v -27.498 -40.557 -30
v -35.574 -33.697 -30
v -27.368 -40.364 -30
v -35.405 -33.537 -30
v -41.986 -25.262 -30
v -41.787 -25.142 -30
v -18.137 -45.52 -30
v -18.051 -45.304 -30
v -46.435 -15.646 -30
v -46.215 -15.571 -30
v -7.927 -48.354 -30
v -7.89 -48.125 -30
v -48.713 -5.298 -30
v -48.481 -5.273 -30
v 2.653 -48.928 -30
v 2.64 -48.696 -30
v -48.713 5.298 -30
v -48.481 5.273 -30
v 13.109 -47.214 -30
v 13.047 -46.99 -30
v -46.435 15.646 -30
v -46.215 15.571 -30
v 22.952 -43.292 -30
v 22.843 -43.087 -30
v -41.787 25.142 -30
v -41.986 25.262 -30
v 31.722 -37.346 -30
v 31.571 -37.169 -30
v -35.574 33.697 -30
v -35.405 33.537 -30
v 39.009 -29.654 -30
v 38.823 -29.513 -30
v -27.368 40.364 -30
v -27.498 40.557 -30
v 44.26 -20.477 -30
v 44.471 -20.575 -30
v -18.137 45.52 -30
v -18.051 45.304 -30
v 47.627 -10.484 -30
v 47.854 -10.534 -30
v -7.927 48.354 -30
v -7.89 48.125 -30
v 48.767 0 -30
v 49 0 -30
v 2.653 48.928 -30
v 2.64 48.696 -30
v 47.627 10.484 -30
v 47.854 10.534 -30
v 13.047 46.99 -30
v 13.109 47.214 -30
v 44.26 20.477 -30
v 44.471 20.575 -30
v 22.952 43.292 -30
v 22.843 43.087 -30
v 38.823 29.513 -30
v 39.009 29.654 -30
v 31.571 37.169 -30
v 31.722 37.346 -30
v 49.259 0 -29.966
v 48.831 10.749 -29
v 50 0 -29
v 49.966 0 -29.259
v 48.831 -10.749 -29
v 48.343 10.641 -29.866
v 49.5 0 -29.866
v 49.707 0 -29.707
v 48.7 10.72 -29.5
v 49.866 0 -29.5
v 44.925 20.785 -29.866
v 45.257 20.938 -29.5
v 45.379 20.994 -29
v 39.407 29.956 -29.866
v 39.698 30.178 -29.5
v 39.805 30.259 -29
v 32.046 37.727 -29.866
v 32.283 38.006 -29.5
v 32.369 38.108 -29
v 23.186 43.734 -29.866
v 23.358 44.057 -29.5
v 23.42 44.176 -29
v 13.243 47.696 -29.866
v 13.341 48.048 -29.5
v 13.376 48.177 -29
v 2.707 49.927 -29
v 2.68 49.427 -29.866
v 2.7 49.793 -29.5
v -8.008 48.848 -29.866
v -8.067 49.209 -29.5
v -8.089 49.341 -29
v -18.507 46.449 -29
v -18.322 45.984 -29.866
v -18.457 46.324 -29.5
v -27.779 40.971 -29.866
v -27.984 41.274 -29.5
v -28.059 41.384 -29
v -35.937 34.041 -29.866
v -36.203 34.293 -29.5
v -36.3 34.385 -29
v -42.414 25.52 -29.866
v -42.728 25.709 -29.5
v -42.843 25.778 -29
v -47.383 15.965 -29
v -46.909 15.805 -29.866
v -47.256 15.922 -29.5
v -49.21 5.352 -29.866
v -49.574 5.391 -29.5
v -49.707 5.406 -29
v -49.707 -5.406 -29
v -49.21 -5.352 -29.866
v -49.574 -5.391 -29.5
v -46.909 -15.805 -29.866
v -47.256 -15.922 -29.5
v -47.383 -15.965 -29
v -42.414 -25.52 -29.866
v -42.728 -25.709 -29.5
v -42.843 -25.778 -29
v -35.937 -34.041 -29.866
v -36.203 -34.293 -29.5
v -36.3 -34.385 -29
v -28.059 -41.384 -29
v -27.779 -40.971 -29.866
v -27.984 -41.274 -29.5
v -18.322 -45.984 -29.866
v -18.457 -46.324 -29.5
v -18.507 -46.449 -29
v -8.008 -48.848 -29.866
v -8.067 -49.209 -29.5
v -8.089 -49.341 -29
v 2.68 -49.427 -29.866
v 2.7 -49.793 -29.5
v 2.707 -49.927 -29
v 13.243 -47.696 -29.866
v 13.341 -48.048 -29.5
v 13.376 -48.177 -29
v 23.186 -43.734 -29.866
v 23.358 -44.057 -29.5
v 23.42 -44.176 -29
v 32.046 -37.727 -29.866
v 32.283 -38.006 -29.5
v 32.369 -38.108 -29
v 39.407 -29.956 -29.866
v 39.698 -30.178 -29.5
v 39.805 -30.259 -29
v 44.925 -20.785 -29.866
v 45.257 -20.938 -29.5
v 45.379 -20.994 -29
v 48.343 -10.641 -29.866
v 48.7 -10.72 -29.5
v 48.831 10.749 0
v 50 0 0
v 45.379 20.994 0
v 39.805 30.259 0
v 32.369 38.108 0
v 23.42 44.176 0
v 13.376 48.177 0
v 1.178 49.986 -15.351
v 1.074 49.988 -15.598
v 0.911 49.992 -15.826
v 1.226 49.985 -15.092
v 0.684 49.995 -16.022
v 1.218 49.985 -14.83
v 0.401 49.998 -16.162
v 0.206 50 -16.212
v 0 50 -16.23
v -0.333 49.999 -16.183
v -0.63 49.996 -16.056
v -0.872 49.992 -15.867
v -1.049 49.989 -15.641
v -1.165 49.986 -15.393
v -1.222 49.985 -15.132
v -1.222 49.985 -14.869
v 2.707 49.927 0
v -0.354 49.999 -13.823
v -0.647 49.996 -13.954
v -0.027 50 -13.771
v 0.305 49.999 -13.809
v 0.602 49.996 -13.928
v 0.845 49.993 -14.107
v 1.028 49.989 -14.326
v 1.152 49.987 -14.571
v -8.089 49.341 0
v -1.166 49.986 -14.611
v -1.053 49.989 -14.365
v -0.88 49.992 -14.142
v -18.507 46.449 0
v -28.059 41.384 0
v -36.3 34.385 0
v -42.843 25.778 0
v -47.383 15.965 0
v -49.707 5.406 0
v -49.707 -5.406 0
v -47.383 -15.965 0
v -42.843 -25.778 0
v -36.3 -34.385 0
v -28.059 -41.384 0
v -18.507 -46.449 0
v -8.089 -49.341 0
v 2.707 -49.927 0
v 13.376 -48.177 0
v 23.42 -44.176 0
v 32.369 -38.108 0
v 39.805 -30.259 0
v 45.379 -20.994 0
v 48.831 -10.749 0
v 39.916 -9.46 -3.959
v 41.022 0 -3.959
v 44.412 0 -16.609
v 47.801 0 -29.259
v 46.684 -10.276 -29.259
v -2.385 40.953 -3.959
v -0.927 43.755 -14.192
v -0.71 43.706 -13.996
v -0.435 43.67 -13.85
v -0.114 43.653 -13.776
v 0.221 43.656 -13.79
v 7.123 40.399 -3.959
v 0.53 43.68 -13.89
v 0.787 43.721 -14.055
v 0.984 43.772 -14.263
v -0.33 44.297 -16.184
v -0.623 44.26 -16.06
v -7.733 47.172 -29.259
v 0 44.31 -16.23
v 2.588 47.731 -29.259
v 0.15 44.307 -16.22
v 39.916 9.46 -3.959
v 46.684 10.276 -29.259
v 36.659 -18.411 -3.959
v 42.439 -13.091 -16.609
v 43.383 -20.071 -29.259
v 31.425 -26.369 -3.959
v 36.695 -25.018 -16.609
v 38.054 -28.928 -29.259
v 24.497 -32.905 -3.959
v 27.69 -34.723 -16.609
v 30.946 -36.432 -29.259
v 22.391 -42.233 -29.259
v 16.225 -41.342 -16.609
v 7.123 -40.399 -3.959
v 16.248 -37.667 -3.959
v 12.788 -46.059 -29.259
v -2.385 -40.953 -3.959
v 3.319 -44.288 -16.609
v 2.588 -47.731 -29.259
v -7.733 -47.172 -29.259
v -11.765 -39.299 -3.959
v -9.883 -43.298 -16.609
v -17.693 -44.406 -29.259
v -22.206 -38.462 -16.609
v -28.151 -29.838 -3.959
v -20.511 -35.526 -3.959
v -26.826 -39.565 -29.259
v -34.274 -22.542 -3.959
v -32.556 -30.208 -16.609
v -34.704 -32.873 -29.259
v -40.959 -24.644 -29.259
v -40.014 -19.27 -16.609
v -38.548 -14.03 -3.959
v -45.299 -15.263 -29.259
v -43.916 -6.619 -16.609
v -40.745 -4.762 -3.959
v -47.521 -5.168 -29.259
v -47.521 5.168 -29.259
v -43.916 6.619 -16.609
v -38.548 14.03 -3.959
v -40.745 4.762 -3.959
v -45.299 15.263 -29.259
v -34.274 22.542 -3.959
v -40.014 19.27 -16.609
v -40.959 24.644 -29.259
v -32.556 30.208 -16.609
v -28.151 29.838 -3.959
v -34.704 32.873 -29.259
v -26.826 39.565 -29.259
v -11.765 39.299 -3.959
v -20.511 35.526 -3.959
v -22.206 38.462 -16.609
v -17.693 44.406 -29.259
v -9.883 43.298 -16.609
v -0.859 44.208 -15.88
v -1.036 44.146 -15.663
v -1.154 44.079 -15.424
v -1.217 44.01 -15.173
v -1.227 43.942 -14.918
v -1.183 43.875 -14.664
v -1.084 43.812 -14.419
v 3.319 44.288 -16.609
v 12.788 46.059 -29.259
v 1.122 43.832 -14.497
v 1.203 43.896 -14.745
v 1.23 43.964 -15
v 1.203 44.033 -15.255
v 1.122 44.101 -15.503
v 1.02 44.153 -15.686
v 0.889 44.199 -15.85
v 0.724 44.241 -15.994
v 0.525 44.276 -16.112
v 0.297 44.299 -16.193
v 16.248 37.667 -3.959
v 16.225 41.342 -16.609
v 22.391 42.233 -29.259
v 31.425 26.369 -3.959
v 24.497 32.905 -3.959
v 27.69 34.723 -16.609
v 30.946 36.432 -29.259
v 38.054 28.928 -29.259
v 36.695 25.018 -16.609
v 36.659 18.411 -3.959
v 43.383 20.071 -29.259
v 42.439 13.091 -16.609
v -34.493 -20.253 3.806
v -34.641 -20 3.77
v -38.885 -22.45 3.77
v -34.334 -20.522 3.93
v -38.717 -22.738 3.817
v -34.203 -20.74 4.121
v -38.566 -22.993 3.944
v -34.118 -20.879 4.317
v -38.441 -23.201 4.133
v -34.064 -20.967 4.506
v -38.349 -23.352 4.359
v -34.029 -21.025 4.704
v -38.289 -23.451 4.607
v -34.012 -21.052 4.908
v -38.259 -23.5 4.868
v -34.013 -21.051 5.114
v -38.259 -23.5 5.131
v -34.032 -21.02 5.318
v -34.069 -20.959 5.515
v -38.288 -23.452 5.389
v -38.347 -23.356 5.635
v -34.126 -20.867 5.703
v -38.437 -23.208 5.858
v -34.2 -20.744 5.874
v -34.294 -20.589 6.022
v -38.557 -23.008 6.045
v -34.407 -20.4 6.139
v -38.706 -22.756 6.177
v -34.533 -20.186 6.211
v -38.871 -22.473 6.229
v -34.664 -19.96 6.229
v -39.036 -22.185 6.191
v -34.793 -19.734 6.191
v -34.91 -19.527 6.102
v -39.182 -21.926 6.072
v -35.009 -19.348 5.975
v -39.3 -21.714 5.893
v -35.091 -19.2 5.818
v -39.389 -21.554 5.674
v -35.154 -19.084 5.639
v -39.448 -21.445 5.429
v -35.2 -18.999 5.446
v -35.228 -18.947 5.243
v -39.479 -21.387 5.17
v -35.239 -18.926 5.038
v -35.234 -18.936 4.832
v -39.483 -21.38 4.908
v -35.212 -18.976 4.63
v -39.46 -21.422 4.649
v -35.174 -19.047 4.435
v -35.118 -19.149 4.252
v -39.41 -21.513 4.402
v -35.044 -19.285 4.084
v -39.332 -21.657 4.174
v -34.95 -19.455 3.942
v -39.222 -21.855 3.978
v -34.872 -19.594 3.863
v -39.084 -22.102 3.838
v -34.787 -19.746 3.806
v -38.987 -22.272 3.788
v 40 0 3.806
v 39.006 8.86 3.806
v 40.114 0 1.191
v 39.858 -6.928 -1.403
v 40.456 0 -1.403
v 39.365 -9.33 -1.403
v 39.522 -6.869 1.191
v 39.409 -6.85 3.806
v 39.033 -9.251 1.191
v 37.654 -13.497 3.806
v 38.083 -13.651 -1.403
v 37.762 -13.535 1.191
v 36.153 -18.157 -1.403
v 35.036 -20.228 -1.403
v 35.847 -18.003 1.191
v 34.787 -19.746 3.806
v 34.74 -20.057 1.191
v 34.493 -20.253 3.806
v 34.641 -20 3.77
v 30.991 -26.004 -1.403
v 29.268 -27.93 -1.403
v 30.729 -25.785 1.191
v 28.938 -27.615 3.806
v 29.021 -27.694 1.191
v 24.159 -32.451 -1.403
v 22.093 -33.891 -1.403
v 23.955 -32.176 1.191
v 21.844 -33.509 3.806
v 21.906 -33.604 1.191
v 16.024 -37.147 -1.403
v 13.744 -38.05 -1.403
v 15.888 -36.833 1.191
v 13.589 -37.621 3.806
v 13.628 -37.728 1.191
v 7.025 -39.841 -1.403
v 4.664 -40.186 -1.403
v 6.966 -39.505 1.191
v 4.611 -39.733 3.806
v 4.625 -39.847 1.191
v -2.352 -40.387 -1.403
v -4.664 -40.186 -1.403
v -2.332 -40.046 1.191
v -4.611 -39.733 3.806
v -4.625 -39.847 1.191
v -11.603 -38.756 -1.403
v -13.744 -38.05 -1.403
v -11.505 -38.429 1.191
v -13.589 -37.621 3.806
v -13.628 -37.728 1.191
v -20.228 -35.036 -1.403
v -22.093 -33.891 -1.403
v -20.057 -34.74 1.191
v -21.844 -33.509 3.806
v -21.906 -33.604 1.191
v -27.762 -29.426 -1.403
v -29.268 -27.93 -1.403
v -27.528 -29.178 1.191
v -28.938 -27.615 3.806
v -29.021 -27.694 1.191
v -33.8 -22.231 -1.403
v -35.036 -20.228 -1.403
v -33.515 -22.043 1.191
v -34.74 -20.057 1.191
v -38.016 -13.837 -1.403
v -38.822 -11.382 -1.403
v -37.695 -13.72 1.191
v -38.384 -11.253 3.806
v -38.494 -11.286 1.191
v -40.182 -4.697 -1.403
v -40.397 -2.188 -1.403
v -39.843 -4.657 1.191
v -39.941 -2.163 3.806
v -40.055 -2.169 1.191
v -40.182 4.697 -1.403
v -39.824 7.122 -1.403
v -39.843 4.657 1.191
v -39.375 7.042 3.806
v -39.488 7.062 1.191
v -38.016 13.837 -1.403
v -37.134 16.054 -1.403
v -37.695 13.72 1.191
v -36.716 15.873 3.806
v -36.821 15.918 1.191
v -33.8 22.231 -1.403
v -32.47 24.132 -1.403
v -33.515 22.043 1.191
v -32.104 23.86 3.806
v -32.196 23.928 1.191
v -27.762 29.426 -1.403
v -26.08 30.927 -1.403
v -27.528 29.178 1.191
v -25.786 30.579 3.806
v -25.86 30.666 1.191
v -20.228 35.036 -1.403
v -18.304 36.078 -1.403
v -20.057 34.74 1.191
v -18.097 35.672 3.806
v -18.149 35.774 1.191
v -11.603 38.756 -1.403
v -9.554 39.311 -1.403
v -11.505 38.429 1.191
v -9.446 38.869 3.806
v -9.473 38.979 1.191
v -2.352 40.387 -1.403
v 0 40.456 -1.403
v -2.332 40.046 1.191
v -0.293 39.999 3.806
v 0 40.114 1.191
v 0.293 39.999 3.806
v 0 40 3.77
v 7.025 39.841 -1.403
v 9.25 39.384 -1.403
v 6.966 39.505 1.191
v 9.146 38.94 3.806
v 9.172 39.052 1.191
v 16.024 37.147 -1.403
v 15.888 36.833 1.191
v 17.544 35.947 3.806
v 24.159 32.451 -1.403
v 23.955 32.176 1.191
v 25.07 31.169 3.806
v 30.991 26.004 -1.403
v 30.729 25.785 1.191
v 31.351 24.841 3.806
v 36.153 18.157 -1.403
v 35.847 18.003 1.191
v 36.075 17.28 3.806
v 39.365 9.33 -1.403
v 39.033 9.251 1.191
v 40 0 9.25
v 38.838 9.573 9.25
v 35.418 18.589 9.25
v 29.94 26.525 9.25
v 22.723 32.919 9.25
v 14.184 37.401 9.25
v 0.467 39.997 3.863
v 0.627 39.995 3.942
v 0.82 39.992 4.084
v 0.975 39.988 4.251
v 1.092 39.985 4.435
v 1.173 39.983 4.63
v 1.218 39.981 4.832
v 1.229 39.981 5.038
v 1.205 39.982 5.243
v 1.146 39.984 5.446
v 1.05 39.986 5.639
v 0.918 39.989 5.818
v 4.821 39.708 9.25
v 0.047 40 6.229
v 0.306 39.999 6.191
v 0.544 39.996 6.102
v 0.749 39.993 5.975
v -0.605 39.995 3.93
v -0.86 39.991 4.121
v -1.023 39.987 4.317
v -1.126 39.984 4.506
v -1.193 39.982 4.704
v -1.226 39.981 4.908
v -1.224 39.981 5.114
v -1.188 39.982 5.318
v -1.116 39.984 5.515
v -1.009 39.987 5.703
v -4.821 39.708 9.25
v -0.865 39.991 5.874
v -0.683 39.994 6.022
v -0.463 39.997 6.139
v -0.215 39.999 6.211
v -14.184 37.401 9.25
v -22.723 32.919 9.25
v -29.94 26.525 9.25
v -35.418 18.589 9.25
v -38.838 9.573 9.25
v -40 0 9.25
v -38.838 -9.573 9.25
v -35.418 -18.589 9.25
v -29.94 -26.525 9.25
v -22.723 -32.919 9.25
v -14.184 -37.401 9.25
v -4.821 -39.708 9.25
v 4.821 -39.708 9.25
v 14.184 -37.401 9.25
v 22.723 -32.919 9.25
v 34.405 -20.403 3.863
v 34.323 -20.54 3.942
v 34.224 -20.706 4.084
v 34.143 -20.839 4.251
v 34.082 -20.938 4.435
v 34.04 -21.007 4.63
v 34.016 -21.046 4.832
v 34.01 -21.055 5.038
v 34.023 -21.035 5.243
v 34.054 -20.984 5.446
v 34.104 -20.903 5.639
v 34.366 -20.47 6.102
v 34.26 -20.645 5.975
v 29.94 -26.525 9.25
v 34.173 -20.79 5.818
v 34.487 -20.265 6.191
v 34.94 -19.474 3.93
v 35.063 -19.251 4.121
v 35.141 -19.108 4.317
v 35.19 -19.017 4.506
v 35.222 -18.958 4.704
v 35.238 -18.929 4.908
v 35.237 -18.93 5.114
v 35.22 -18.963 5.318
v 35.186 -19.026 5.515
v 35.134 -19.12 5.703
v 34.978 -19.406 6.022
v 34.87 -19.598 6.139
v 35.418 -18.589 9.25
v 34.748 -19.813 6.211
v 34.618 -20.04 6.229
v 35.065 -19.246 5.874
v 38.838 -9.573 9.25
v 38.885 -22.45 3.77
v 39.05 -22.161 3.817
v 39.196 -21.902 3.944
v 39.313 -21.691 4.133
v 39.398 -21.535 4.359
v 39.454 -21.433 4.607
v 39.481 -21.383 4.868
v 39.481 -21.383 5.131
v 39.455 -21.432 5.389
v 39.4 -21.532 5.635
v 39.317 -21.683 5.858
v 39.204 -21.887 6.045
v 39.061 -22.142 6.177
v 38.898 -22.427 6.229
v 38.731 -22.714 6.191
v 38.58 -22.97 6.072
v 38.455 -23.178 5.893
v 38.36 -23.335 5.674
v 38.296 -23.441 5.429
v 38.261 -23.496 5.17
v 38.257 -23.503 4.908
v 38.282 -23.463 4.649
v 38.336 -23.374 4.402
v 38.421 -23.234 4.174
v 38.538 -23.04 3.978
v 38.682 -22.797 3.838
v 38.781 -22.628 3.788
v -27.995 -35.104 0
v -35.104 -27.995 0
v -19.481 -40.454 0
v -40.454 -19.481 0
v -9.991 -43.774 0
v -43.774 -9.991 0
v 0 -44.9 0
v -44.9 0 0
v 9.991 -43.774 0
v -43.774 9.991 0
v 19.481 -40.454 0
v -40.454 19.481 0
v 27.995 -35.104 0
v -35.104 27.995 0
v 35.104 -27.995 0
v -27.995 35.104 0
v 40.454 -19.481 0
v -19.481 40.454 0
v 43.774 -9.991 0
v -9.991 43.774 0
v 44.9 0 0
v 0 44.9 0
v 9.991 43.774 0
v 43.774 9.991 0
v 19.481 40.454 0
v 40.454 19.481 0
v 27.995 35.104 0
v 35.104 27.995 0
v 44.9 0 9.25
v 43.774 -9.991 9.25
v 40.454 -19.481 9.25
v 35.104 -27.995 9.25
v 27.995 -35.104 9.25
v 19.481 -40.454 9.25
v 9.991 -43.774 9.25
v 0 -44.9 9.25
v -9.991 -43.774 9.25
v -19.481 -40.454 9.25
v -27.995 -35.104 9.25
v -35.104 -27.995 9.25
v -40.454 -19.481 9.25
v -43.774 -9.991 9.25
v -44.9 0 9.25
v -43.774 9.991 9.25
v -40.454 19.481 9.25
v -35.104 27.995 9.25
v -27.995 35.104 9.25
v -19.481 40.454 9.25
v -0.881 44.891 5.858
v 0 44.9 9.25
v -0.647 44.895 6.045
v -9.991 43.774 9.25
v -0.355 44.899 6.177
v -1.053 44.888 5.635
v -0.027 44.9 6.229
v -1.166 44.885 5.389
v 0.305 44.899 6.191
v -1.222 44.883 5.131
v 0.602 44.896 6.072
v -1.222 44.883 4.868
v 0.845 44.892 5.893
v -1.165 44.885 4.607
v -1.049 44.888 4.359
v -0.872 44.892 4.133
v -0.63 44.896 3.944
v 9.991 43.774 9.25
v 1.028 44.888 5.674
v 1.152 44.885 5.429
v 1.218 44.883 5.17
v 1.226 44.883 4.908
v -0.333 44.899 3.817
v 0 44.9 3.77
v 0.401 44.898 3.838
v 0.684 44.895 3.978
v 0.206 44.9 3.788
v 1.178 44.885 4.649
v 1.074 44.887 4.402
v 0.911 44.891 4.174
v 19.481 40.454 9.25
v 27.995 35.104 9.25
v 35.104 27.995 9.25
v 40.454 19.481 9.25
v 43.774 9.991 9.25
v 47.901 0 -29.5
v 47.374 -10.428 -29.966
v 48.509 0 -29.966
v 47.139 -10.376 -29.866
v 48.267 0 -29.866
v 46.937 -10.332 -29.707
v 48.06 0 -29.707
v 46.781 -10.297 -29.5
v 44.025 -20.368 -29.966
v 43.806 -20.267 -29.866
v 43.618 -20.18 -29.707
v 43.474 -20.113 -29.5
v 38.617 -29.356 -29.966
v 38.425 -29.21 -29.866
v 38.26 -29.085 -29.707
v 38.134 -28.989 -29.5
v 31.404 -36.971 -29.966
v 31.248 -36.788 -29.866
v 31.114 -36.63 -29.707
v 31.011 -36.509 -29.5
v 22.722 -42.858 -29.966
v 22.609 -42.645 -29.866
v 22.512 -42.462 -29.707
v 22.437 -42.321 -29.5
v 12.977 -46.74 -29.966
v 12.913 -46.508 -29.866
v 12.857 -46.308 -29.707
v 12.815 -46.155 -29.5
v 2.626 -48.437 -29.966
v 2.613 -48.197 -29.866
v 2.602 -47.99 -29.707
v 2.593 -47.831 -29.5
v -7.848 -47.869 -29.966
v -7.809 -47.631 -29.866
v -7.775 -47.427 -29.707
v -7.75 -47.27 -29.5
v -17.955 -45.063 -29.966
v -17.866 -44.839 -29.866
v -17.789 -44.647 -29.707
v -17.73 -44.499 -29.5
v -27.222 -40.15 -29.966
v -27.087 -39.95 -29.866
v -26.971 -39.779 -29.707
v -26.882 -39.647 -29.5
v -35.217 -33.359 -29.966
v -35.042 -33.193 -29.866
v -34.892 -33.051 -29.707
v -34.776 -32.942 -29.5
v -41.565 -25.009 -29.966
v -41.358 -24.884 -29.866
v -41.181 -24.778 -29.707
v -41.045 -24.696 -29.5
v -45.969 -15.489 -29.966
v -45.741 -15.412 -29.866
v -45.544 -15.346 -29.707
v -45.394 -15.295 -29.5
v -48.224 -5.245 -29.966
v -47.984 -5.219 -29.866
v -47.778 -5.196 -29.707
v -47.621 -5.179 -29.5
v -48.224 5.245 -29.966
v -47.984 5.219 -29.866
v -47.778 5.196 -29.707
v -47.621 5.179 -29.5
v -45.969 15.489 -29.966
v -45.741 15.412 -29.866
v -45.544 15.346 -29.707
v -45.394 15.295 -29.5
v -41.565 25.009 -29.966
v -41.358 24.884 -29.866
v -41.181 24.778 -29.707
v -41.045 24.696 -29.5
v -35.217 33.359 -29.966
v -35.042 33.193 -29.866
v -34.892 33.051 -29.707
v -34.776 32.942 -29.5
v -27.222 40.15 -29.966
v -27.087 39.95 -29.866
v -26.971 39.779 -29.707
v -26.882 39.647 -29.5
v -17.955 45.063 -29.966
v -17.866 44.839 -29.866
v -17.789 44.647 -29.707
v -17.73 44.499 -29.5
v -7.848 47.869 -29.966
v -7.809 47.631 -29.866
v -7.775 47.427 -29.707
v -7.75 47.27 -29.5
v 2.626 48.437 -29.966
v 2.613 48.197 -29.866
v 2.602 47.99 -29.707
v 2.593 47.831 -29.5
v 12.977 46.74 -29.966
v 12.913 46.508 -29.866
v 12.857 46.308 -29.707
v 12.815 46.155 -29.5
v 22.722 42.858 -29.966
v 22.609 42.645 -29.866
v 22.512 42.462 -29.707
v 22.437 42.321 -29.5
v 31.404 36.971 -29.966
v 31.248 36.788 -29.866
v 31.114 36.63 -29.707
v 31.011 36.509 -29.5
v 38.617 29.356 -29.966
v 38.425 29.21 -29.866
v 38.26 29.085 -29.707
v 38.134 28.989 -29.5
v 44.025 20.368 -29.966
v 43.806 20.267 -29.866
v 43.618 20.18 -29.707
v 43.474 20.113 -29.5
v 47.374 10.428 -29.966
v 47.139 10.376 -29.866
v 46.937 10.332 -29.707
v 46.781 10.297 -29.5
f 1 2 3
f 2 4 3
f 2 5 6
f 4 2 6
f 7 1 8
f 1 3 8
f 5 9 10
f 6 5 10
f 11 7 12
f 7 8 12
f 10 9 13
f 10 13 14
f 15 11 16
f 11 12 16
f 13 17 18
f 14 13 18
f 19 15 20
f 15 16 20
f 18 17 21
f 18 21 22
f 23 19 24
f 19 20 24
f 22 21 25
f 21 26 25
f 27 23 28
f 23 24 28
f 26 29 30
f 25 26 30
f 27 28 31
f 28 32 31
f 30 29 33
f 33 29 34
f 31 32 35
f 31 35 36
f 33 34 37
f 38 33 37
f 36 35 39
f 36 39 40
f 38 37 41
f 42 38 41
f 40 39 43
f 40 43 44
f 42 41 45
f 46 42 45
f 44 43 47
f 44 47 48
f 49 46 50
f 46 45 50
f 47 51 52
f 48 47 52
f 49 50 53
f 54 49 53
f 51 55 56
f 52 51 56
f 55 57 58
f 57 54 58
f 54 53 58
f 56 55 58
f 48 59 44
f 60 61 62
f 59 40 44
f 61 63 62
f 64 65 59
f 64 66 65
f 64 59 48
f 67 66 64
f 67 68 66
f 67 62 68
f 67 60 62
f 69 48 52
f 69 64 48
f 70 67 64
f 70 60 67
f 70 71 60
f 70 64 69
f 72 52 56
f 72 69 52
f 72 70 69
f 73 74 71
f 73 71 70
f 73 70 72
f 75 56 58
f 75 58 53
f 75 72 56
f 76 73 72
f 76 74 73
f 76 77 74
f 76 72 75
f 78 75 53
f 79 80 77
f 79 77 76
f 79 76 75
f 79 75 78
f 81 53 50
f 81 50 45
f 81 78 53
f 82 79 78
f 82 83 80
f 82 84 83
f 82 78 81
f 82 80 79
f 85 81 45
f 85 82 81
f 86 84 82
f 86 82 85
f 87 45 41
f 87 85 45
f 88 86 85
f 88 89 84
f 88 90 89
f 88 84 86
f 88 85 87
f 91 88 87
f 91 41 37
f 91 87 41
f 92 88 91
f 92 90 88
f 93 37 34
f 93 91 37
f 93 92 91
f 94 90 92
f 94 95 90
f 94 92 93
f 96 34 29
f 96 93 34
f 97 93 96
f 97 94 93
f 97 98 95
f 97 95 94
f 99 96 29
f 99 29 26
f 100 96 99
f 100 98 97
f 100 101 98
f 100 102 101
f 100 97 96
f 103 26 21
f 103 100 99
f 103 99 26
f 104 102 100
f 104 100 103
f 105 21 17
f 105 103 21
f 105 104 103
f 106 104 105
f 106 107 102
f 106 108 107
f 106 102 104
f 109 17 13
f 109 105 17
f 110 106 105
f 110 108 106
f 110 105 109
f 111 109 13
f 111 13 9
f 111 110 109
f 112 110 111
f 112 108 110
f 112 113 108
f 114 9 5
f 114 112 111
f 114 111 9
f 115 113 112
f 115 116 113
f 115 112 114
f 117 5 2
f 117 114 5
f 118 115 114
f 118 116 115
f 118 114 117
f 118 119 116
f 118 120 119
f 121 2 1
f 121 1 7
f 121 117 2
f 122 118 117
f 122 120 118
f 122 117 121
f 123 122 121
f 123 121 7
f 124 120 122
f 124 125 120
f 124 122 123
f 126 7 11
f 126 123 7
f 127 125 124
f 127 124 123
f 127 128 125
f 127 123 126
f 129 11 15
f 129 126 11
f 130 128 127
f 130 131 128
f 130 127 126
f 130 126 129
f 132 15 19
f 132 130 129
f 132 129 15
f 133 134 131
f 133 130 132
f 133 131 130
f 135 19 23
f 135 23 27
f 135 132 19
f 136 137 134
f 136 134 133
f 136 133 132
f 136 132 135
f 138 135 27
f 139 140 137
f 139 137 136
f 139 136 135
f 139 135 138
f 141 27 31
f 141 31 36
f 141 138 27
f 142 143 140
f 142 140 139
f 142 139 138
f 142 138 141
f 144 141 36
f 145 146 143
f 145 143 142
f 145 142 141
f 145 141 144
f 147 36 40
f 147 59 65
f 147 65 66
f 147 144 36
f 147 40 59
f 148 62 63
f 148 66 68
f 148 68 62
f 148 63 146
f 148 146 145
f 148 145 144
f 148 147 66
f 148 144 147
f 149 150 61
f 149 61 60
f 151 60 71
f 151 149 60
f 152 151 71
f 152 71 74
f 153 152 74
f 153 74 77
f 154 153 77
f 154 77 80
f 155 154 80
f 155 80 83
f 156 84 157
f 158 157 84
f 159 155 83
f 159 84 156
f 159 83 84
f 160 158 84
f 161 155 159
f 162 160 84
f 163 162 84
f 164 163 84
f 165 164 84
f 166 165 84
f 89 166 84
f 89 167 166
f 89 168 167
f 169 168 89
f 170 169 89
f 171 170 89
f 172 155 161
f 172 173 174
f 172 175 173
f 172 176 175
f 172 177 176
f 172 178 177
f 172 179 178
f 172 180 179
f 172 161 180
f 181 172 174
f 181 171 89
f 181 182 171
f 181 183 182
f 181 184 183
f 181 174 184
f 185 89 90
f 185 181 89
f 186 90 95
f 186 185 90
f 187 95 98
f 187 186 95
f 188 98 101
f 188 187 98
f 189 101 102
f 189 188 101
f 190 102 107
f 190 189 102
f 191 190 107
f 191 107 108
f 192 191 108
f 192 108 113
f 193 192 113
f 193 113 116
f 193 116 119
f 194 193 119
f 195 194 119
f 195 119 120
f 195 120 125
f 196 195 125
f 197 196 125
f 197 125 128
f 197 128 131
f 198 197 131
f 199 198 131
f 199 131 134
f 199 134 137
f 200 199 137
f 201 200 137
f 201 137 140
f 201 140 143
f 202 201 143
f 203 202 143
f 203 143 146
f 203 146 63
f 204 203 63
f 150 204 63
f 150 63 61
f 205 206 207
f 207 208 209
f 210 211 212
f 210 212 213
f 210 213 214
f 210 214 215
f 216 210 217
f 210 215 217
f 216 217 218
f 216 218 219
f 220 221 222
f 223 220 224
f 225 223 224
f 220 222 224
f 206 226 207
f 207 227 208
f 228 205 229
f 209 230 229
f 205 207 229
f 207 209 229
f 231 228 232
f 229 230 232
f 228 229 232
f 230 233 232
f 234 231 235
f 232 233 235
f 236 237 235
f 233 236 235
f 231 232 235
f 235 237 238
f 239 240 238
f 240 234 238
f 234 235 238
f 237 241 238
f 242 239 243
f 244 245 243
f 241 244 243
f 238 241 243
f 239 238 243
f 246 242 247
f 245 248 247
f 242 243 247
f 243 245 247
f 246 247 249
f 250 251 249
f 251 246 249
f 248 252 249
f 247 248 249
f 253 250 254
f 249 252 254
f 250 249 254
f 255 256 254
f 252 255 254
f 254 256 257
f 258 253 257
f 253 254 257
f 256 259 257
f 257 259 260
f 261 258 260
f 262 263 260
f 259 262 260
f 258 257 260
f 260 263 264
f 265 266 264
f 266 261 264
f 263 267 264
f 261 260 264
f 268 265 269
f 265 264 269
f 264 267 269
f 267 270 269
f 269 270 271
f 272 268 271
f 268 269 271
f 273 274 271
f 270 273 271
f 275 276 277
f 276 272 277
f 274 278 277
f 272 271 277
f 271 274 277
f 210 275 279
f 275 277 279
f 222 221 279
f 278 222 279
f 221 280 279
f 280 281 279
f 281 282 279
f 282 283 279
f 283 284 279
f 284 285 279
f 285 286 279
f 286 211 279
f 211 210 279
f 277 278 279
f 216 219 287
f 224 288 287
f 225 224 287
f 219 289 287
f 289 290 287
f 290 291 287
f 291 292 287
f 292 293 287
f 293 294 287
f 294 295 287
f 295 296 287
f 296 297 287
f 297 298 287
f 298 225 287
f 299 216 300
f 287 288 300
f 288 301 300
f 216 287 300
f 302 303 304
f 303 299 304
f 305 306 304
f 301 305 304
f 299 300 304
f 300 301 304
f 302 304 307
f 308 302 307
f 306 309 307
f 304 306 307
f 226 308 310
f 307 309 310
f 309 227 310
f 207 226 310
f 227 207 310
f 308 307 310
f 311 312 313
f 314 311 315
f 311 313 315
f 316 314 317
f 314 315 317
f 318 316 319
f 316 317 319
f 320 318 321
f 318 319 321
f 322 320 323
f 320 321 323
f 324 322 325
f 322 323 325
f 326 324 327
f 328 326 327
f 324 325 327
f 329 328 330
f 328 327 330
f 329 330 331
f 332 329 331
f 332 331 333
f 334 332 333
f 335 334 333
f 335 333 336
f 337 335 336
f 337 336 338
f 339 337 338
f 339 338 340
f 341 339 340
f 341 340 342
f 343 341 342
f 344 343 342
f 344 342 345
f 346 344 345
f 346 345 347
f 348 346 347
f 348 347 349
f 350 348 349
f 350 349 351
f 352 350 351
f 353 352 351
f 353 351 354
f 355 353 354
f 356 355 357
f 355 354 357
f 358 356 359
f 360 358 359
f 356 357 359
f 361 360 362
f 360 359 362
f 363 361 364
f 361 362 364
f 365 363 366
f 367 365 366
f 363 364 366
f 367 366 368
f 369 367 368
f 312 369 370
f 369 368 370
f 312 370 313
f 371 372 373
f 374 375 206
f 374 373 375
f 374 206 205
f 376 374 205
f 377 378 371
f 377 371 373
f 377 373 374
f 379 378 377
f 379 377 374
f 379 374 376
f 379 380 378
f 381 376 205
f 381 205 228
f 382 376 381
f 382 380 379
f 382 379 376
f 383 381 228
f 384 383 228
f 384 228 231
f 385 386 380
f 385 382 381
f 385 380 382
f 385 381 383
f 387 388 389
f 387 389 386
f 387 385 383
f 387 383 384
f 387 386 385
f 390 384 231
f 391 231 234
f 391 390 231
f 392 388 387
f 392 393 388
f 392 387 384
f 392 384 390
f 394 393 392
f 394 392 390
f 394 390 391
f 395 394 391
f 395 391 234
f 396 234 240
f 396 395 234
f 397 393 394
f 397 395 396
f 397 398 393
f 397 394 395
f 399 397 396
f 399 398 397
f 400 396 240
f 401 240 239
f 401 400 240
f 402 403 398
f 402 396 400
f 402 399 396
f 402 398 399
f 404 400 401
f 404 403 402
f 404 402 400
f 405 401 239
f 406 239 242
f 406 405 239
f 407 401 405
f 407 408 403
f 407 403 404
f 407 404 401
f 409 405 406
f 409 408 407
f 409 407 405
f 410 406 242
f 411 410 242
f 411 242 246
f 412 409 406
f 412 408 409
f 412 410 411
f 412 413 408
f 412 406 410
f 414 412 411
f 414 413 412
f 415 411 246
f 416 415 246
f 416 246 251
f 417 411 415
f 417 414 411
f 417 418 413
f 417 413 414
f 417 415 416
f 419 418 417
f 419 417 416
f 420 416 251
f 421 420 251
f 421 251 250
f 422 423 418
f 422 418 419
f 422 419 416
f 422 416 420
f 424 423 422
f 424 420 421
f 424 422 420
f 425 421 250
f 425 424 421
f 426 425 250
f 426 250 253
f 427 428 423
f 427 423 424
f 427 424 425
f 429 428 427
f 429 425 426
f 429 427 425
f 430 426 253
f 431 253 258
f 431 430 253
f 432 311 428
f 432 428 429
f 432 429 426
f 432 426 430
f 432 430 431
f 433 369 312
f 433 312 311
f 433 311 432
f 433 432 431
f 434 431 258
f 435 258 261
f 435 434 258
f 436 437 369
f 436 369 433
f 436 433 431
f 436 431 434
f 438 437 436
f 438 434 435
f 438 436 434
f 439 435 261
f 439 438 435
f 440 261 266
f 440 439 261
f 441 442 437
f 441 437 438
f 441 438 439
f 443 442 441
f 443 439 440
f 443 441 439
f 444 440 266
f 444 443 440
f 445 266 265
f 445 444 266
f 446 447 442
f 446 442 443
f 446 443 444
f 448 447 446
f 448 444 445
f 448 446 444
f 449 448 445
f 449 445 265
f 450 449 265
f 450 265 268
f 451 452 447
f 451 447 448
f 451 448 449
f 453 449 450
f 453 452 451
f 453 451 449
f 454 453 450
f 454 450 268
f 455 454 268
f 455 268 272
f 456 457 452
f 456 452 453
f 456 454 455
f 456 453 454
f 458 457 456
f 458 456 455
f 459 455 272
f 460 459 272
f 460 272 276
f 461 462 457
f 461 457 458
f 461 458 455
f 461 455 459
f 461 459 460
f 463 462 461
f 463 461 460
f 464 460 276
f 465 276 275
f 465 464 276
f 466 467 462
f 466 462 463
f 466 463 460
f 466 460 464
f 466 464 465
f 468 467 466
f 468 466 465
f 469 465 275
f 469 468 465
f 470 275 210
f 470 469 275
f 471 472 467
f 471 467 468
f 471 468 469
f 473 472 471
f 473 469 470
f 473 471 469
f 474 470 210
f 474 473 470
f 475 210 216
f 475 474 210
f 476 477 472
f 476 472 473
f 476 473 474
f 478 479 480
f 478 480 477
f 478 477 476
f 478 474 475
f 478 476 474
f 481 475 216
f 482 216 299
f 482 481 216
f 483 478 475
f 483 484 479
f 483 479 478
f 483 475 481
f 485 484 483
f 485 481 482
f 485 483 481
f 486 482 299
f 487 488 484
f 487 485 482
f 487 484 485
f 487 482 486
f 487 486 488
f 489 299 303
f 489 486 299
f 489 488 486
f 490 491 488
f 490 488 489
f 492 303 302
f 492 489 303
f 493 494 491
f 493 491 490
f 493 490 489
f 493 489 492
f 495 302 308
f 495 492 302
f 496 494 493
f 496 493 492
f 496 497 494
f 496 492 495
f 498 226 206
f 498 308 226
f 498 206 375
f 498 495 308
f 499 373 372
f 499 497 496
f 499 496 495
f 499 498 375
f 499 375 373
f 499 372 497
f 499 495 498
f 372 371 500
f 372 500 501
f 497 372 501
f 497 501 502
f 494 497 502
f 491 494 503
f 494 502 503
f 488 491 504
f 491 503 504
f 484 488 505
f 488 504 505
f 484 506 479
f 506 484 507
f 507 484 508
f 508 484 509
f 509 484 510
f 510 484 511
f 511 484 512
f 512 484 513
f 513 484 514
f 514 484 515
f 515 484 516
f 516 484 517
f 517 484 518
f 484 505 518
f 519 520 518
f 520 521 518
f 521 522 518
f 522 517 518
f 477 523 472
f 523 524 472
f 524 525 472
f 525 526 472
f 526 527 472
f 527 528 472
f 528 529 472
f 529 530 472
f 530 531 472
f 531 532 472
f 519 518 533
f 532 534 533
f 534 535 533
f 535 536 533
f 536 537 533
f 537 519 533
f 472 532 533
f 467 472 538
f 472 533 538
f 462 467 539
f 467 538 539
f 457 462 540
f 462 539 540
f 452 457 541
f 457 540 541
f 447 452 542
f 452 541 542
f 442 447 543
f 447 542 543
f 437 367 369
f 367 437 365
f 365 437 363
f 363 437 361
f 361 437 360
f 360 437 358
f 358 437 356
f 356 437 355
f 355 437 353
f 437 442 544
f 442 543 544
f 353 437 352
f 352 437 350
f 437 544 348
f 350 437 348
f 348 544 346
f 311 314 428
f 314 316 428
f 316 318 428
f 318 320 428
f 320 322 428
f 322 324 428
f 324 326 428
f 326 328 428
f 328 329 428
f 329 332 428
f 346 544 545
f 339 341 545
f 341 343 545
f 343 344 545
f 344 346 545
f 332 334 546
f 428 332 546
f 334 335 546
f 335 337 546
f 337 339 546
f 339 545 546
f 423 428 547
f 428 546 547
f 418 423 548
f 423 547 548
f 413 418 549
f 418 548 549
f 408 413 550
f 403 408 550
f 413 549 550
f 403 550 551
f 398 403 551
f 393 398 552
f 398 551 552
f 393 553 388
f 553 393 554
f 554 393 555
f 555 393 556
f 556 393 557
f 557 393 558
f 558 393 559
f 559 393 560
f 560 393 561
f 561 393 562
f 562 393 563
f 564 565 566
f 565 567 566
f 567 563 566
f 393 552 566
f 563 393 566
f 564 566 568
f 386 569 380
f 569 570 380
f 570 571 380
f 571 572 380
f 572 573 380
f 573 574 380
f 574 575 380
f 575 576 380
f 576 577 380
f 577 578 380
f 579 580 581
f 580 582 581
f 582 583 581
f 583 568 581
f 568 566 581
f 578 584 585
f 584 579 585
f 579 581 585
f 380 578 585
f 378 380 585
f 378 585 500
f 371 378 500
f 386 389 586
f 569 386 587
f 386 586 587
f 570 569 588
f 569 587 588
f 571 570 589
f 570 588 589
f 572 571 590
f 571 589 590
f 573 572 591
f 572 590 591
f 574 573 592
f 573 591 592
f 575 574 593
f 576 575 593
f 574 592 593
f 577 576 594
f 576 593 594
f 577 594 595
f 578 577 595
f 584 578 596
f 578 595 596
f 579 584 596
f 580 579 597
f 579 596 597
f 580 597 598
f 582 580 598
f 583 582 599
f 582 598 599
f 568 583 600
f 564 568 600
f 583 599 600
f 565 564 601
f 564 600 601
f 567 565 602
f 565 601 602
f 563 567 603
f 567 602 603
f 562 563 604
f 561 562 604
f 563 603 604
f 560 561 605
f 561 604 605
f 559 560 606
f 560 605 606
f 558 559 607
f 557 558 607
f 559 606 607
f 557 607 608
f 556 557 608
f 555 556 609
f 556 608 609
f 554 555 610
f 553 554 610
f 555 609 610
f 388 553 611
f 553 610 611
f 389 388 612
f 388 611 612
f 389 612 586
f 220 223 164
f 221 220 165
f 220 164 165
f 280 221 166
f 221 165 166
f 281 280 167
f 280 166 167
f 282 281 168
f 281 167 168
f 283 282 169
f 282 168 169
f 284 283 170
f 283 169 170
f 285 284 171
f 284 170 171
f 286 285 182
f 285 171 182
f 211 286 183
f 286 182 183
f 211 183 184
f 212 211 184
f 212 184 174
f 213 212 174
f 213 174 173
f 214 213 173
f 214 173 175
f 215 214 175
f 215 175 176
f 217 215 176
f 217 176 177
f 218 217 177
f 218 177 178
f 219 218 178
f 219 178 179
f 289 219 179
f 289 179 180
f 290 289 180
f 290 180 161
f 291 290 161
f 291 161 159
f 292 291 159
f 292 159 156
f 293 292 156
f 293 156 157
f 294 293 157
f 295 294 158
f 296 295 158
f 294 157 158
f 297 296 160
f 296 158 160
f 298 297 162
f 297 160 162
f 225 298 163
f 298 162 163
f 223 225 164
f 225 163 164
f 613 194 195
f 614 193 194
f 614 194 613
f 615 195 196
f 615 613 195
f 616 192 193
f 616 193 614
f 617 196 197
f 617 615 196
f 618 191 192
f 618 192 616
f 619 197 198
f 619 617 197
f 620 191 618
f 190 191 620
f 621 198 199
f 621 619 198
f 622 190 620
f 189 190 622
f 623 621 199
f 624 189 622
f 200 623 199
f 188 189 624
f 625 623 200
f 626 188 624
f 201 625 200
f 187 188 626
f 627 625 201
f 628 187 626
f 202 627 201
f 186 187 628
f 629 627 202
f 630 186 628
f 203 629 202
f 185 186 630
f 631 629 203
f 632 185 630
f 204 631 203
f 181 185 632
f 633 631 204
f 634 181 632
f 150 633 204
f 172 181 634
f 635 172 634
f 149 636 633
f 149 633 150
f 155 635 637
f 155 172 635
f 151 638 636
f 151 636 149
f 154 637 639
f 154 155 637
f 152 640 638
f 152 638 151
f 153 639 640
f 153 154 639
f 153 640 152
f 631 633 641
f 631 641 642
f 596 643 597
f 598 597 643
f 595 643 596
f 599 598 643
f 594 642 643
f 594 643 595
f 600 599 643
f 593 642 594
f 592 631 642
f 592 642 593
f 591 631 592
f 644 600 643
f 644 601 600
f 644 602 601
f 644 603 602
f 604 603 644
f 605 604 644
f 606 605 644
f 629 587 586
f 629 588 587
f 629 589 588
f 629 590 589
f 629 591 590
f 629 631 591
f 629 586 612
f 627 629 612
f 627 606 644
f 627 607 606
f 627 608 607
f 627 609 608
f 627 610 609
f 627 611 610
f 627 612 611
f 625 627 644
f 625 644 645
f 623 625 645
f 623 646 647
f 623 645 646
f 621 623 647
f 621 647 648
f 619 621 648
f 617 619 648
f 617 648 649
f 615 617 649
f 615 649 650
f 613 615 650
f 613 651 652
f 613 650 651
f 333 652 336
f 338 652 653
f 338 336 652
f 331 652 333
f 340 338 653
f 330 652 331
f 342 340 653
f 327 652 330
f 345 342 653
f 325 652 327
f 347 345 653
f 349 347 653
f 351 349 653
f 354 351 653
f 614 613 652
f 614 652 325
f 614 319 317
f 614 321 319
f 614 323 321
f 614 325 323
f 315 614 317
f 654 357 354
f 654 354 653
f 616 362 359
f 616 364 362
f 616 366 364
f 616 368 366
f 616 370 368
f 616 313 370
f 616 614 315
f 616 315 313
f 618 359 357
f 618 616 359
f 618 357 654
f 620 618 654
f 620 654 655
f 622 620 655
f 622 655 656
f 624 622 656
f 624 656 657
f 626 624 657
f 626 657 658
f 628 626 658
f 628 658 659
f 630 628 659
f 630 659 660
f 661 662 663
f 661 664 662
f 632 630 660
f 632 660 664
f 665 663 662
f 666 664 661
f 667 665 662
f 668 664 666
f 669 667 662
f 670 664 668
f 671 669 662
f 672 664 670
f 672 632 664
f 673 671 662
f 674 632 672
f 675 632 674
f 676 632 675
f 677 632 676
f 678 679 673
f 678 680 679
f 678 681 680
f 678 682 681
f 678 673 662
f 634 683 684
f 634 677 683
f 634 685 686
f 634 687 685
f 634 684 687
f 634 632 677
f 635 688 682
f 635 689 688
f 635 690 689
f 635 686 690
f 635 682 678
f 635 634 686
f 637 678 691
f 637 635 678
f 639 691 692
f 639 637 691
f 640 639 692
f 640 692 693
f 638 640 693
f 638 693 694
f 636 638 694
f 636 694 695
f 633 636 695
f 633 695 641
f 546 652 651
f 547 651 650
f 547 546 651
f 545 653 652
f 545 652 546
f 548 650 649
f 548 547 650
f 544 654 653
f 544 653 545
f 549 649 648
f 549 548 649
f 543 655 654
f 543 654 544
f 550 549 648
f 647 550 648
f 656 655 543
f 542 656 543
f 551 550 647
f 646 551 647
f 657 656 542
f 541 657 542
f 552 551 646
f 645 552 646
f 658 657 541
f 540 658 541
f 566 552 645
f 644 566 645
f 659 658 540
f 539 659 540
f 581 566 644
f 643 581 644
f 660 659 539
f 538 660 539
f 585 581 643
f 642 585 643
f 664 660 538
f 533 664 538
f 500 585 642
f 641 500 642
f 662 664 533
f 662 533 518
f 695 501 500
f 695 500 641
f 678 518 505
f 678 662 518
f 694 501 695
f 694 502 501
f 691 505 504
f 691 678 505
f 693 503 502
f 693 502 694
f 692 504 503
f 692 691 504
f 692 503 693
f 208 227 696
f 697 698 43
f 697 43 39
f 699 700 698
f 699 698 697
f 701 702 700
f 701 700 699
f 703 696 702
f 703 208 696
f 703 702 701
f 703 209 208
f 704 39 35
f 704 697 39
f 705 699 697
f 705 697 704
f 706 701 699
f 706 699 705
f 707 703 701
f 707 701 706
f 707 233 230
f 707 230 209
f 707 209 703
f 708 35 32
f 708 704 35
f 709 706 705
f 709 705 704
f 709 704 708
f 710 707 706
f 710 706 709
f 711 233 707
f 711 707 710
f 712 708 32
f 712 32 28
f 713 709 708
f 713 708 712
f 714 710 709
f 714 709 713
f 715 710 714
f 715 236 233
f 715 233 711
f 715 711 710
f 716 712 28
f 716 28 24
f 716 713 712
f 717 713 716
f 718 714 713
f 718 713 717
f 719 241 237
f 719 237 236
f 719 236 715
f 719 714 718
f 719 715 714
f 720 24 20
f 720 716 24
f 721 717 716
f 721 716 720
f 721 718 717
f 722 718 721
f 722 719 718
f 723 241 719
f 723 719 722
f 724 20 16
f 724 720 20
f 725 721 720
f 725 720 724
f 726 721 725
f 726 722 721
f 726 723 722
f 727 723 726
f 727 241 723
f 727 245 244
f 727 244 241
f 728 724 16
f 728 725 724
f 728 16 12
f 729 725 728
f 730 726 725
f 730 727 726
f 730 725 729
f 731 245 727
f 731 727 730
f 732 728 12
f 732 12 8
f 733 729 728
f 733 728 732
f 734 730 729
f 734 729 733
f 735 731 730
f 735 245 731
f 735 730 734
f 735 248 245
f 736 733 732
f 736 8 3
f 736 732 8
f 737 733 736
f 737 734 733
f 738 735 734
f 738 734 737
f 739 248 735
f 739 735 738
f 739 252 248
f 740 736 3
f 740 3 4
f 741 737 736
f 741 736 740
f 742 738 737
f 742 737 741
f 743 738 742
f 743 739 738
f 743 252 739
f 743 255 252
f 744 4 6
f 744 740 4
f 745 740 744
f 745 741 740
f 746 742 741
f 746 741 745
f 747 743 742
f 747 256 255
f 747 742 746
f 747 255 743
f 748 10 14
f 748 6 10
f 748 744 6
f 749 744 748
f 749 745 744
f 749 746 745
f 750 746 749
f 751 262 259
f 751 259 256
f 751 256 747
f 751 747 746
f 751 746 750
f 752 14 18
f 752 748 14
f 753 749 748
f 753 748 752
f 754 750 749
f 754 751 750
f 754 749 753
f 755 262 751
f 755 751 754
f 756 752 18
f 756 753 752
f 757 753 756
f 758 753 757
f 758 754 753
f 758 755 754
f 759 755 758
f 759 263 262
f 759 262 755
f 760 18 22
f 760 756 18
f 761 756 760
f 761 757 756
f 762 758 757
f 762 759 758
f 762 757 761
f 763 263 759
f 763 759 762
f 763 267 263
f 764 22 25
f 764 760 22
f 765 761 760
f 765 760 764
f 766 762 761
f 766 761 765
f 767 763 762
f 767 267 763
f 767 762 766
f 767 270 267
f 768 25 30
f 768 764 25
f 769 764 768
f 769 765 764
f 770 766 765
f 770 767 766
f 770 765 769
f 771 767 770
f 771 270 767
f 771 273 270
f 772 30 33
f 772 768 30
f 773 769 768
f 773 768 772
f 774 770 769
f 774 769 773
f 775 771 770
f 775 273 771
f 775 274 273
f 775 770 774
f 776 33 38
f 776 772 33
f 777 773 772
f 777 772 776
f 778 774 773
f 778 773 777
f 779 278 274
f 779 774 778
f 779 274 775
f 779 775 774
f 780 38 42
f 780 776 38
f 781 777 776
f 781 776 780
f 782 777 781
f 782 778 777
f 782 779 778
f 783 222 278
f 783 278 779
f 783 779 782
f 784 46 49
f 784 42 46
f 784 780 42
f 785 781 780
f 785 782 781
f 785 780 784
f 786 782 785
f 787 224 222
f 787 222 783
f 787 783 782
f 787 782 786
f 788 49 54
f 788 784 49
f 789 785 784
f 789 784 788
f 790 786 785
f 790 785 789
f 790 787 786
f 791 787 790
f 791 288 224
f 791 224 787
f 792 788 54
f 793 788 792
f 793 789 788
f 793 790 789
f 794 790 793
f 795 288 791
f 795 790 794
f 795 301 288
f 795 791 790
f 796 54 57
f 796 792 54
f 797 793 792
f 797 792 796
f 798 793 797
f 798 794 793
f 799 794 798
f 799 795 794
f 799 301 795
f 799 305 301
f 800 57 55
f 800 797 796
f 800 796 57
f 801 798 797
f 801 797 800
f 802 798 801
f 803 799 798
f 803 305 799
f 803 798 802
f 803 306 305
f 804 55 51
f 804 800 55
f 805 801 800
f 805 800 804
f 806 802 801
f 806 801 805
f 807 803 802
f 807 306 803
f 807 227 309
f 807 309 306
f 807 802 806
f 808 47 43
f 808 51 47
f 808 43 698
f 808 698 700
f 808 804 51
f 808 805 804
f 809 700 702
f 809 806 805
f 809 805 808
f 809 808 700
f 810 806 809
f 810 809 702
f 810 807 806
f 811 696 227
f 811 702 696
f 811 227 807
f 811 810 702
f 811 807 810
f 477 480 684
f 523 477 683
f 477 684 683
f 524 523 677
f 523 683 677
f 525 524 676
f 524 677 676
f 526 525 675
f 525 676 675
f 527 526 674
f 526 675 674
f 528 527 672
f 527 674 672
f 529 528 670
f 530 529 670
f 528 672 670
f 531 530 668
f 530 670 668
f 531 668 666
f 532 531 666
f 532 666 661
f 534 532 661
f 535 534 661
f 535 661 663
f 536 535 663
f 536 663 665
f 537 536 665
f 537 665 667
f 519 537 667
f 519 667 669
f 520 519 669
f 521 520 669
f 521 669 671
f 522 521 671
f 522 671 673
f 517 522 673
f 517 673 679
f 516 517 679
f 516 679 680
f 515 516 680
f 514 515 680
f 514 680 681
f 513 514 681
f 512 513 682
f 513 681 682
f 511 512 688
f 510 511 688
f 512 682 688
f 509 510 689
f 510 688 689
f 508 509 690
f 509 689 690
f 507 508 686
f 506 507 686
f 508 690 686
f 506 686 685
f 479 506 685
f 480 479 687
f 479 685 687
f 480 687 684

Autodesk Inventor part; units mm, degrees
ref_plane "YZ Plane" through (0, 0, 0) normal (1, 0, 0) x (0, 1, 0)
ref_plane "XZ Plane" through (0, 0, 0) normal (0, 1, 0) x (-1, 0, 0)
ref_plane "XY Plane" through (0, 0, 0) normal (0, 0, 1) x (1, 0, 0)
sketch "Sketch1" plane through (0, 0, 0) normal (0, 0, 1) x (1, 0, 0)
  circle A0 centre (0, 0) radius 40
  circle A1 centre (0, 0) radius 50
  dimension "d0" = 80
  dimension "d1" = 100
extrude "Extrusion1" add sketch "Sketch1" against normal blind 30
sketch "Sketch2" plane through (0, 0, 0) normal (0, 0, 1) x (1, 0, 0)
  circle A0 centre (0, 0) radius 44.9
  circle A1 centre (0, 0) radius 40 projected
  dimension "d4" = 89.8
extrude "Extrusion2" add sketch "Sketch2" along normal blind 9.25
sketch "Sketch3" plane through (0, 0, 0) normal (0, 1, 0) x (-1, 0, 0)
  point P0 (0, 0)
  point P1 (0, 5)
  dimension "d7" = 5
hole "Hole1" at (0, 0, 5) direction (0, 1, 0) diameter 2.459 end through all thread size "M3x0.5" class "6H" standard "ISO Metric profile"
pattern_circular "Circular Pattern1" count 3 over 360 about axis through (0, 0, -10) along (0, 0, 1) of "Hole1"
sketch "Sketch4" plane through (0, 0, 0) normal (0, 1, 0) x (-1, 0, 0)
  point P0 (0, -15)
  point P1 (0, 0)
  dimension "d23" = 15
hole "Hole2" at (0, 0, -15) direction (0, 1, 0) diameter 2.459 end through all counterbore diameter 6.5 counterbore depth 3.4 thread size "M3x0.5" class "6H" standard "ANSI Metric M Profile"
chamfer "Chamfer1" distance 8 angle 75 1 edges at (-40, 0, -30)
fillet "Fillet1" radius 30 1 edges at (-40, 0, -0.1436)
fillet "Fillet2" radius 1 2 edges at (-48, 0, -30) (-50, 0, -30)
properties part number "Tail"
